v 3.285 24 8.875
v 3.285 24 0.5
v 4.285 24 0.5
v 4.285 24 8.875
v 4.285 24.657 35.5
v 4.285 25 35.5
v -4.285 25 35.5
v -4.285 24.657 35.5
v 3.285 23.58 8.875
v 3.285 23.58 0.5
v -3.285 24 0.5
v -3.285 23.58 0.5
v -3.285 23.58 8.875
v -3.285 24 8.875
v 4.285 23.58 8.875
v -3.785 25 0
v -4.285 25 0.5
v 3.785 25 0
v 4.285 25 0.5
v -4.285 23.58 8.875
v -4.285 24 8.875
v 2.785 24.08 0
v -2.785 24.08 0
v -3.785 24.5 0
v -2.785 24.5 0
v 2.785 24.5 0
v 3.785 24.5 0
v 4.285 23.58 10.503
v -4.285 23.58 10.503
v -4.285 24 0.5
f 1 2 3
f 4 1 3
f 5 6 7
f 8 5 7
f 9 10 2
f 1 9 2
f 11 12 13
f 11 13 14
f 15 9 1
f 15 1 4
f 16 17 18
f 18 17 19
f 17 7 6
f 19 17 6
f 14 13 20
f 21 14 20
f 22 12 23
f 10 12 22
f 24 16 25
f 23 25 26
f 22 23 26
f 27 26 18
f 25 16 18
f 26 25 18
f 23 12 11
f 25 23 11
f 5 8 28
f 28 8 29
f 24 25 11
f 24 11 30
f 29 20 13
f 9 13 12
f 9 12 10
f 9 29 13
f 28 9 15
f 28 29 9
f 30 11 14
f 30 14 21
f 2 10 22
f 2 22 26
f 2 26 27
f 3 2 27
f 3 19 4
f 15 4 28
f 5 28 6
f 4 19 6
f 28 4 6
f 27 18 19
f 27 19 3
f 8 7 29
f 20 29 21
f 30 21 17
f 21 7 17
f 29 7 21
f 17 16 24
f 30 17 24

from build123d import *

# Parameters (mm, degrees)
PAD003_DEPTH    = 1.42
POCKET004_DEPTH = 8.875
POCKET005_DEPTH = 8.570714
CHAMFER002_SIZE = 0.5


with BuildPart() as part:
    # Sketch010 → Pad003 (new body)
    with BuildSketch(Plane.XZ):
        Polygon((-4.284857, 0), (4.284857, 0), (4.284857, 8.875), (4.284857, 35.5), (-4.284857, 35.5), (-4.284857, 8.875), align=None)
    extrude(amount=PAD003_DEPTH)

    # Sketch011 (on Face1 of Pad003) → Pocket004 (cut)
    with BuildSketch(Plane(origin=(0, 0, 0), x_dir=(1, 0, 0), z_dir=(0, 0, -1))):
        Polygon((-3.284857, 1.42), (-3.284857, 1), (-8.284857, 1), (-8.284857, 4.921038), align=None)
        Polygon((8.284857, 4.921038), (3.284857, 1.42), (3.284857, 1), (8.284857, 1), align=None)
    extrude(amount=-POCKET004_DEPTH, mode=Mode.SUBTRACT)

    # Sketch012 (on Face9 of Pocket004) → Pocket005 (cut, through all)
    with BuildSketch(Plane(origin=(-4.284857, 0, 0), x_dir=(0, 0, -1), z_dir=(-1, 0, 0))):
        Polygon((-39.051991, 0.19), (-10.038814, 1.44), (-39.051991, 14.02), align=None)
    extrude(amount=-POCKET005_DEPTH, mode=Mode.SUBTRACT)

    # Chamfer002
    chamfer002_edges = [part.edges().sort_by_distance(p)[0] for p in [
        (-3.784857, -1, 0),
        (-3.284857, -1.21, 0),
        (0, -1.42, 0),
        (3.284857, -1.21, 0),
        (3.784857, -1, 0),
        (-4.284857, -0.5, 0),
        (4.284857, -0.5, 0),
    ]]
    chamfer(chamfer002_edges, length=CHAMFER002_SIZE)


with BuildPart() as part_1:
    # Body001 placement: moved
    add(part.part.moved(Location((0, 25, 0))))


solid = part_1.part
